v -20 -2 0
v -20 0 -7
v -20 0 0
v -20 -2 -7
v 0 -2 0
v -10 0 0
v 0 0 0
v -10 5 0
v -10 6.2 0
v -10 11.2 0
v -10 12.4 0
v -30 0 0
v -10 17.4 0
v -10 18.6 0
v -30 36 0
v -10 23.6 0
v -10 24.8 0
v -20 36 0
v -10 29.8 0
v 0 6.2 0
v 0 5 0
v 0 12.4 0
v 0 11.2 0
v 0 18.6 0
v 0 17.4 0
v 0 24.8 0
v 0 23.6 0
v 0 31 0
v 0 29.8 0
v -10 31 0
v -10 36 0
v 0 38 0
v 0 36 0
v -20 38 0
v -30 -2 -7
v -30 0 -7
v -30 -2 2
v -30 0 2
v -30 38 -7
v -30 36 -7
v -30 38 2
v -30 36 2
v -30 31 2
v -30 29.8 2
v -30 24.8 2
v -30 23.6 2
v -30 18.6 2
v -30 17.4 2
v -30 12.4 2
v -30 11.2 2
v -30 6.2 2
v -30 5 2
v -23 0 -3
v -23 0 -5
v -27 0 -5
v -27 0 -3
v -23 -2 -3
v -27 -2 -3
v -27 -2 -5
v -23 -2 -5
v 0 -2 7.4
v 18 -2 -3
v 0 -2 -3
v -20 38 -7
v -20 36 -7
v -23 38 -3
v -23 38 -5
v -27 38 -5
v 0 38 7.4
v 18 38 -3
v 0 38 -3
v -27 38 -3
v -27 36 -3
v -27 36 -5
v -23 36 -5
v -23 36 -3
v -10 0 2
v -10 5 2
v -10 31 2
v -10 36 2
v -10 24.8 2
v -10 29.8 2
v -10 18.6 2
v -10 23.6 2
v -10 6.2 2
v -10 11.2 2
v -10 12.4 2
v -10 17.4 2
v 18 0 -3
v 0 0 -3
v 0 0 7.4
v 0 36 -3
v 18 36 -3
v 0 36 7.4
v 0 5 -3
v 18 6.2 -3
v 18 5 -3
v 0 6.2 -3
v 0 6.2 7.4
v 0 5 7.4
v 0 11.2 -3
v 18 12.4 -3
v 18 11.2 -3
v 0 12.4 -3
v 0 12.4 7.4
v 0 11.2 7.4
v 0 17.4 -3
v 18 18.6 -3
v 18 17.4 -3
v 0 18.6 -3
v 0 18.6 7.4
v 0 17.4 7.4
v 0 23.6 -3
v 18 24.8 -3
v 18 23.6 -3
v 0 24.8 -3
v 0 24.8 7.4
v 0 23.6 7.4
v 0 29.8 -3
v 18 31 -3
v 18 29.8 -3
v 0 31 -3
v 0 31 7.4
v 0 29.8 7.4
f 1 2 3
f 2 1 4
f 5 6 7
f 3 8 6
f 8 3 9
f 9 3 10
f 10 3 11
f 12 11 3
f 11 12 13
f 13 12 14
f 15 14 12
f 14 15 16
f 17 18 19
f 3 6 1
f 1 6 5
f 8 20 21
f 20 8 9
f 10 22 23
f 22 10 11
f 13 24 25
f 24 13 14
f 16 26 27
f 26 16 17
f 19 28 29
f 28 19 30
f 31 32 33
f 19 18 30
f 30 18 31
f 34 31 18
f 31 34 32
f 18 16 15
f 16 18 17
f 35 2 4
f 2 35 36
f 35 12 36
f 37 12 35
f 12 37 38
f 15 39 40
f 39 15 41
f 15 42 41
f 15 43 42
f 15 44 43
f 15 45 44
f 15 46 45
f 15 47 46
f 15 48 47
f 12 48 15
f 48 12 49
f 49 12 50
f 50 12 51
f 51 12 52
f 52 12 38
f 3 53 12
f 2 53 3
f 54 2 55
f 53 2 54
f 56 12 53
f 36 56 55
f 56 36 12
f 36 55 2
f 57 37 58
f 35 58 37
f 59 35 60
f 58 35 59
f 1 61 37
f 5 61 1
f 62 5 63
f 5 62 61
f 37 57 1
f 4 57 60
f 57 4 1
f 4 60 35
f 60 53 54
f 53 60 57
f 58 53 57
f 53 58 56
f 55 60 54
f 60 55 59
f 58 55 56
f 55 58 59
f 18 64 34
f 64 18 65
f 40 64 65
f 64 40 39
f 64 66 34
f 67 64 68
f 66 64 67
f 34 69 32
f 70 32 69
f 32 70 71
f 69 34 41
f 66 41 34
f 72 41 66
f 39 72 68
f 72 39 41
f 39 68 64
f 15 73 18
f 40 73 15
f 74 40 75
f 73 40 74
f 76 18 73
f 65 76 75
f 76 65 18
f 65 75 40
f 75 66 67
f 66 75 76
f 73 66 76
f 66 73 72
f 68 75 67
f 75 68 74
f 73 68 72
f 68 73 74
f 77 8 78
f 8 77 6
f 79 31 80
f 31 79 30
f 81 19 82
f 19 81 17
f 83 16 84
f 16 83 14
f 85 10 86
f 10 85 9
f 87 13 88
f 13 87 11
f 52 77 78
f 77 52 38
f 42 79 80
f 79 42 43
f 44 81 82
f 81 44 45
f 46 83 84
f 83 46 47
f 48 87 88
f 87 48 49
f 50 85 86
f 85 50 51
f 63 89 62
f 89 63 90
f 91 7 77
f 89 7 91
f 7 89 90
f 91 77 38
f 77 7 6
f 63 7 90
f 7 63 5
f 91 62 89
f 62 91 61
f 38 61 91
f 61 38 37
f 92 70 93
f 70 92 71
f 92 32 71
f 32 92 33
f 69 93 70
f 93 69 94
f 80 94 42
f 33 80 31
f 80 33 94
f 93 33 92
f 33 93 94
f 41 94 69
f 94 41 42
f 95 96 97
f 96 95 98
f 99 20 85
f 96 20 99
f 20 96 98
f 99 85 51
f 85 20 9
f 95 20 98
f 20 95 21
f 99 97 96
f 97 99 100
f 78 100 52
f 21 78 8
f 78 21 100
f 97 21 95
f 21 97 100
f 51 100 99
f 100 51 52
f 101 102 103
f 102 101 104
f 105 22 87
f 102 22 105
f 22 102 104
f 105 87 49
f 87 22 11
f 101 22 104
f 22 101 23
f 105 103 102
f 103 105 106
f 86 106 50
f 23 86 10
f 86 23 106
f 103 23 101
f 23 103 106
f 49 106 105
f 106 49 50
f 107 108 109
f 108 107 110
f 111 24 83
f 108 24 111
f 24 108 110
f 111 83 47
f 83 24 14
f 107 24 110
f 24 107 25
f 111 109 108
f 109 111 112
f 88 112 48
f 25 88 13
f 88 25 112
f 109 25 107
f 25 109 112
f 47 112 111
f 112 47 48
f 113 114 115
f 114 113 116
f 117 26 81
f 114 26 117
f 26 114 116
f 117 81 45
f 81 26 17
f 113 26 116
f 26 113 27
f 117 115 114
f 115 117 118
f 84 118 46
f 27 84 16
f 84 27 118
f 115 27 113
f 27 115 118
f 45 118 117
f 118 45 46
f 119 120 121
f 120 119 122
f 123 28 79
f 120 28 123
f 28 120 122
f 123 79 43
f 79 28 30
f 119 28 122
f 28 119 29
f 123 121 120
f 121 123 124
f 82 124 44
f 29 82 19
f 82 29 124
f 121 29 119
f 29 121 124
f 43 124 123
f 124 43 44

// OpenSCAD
module prism(l, w, h){
   polyhedron( 
    points=[[0,0,0], [l,0,0], [l,w,0], [0,w,0], [0,w,h], [l,w,h]],
    faces=[[0,1,2,3],[5,4,3,2],[0,4,5,1],[0,3,4],[5,2,1]]
   );
}

module spacer_9mm(wall){
    rear_length=30;
    rear_offset_z=2;
    translate([0,-wall,0]){
        //the front piece
        translate([18,0,-3])
            rotate([0,0,90])
                prism(wall,18,10.4);
        //the rear piece
        translate([-rear_length,wall,rear_offset_z])
            rotate([0,0,-90])
                prism(wall,rear_length,5.4);        
        //fill-in bit
        translate([-rear_length,0,0])
            cube(size=[rear_length,wall,rear_offset_z]);        
    }
}

module mount_plate_side() {
    height = 7;
    width = 10;
    wall = 2;
    offset_x = 30;
    
    translate([-offset_x,0,-height]){
        difference(){
            cube(size=[width,wall,height]);
            translate([3,0,2])
                cube(size=[4,wall,2]);
        }
    }
}

module mount_plate(clipper_width){
    center_width =20;
    wall = 2;
    offset_x = 30;

    //the center piece
    translate([-offset_x,-wall,0])
        cube(size=[center_width,clipper_width+2*wall,wall]);
    //one side piece
    translate([0, -wall, 0])
        mount_plate_side();
    //the other side piece
    translate([0, clipper_width,  0]) 
        mount_plate_side();    
}

module clipper_comb_9mm() {
    width = 36;
    // the complete mount plate
    mount_plate(width);
    // the two sides (thicker)
    spacer_9mm(2);
    translate([0, width + 2,  0])
        spacer_9mm(2);
    // 5 more sides (thinner)
    for (i=[1:5])
        translate([0, i*6.2, 0])
            spacer_9mm(1.2); 
}

clipper_comb_9mm();
